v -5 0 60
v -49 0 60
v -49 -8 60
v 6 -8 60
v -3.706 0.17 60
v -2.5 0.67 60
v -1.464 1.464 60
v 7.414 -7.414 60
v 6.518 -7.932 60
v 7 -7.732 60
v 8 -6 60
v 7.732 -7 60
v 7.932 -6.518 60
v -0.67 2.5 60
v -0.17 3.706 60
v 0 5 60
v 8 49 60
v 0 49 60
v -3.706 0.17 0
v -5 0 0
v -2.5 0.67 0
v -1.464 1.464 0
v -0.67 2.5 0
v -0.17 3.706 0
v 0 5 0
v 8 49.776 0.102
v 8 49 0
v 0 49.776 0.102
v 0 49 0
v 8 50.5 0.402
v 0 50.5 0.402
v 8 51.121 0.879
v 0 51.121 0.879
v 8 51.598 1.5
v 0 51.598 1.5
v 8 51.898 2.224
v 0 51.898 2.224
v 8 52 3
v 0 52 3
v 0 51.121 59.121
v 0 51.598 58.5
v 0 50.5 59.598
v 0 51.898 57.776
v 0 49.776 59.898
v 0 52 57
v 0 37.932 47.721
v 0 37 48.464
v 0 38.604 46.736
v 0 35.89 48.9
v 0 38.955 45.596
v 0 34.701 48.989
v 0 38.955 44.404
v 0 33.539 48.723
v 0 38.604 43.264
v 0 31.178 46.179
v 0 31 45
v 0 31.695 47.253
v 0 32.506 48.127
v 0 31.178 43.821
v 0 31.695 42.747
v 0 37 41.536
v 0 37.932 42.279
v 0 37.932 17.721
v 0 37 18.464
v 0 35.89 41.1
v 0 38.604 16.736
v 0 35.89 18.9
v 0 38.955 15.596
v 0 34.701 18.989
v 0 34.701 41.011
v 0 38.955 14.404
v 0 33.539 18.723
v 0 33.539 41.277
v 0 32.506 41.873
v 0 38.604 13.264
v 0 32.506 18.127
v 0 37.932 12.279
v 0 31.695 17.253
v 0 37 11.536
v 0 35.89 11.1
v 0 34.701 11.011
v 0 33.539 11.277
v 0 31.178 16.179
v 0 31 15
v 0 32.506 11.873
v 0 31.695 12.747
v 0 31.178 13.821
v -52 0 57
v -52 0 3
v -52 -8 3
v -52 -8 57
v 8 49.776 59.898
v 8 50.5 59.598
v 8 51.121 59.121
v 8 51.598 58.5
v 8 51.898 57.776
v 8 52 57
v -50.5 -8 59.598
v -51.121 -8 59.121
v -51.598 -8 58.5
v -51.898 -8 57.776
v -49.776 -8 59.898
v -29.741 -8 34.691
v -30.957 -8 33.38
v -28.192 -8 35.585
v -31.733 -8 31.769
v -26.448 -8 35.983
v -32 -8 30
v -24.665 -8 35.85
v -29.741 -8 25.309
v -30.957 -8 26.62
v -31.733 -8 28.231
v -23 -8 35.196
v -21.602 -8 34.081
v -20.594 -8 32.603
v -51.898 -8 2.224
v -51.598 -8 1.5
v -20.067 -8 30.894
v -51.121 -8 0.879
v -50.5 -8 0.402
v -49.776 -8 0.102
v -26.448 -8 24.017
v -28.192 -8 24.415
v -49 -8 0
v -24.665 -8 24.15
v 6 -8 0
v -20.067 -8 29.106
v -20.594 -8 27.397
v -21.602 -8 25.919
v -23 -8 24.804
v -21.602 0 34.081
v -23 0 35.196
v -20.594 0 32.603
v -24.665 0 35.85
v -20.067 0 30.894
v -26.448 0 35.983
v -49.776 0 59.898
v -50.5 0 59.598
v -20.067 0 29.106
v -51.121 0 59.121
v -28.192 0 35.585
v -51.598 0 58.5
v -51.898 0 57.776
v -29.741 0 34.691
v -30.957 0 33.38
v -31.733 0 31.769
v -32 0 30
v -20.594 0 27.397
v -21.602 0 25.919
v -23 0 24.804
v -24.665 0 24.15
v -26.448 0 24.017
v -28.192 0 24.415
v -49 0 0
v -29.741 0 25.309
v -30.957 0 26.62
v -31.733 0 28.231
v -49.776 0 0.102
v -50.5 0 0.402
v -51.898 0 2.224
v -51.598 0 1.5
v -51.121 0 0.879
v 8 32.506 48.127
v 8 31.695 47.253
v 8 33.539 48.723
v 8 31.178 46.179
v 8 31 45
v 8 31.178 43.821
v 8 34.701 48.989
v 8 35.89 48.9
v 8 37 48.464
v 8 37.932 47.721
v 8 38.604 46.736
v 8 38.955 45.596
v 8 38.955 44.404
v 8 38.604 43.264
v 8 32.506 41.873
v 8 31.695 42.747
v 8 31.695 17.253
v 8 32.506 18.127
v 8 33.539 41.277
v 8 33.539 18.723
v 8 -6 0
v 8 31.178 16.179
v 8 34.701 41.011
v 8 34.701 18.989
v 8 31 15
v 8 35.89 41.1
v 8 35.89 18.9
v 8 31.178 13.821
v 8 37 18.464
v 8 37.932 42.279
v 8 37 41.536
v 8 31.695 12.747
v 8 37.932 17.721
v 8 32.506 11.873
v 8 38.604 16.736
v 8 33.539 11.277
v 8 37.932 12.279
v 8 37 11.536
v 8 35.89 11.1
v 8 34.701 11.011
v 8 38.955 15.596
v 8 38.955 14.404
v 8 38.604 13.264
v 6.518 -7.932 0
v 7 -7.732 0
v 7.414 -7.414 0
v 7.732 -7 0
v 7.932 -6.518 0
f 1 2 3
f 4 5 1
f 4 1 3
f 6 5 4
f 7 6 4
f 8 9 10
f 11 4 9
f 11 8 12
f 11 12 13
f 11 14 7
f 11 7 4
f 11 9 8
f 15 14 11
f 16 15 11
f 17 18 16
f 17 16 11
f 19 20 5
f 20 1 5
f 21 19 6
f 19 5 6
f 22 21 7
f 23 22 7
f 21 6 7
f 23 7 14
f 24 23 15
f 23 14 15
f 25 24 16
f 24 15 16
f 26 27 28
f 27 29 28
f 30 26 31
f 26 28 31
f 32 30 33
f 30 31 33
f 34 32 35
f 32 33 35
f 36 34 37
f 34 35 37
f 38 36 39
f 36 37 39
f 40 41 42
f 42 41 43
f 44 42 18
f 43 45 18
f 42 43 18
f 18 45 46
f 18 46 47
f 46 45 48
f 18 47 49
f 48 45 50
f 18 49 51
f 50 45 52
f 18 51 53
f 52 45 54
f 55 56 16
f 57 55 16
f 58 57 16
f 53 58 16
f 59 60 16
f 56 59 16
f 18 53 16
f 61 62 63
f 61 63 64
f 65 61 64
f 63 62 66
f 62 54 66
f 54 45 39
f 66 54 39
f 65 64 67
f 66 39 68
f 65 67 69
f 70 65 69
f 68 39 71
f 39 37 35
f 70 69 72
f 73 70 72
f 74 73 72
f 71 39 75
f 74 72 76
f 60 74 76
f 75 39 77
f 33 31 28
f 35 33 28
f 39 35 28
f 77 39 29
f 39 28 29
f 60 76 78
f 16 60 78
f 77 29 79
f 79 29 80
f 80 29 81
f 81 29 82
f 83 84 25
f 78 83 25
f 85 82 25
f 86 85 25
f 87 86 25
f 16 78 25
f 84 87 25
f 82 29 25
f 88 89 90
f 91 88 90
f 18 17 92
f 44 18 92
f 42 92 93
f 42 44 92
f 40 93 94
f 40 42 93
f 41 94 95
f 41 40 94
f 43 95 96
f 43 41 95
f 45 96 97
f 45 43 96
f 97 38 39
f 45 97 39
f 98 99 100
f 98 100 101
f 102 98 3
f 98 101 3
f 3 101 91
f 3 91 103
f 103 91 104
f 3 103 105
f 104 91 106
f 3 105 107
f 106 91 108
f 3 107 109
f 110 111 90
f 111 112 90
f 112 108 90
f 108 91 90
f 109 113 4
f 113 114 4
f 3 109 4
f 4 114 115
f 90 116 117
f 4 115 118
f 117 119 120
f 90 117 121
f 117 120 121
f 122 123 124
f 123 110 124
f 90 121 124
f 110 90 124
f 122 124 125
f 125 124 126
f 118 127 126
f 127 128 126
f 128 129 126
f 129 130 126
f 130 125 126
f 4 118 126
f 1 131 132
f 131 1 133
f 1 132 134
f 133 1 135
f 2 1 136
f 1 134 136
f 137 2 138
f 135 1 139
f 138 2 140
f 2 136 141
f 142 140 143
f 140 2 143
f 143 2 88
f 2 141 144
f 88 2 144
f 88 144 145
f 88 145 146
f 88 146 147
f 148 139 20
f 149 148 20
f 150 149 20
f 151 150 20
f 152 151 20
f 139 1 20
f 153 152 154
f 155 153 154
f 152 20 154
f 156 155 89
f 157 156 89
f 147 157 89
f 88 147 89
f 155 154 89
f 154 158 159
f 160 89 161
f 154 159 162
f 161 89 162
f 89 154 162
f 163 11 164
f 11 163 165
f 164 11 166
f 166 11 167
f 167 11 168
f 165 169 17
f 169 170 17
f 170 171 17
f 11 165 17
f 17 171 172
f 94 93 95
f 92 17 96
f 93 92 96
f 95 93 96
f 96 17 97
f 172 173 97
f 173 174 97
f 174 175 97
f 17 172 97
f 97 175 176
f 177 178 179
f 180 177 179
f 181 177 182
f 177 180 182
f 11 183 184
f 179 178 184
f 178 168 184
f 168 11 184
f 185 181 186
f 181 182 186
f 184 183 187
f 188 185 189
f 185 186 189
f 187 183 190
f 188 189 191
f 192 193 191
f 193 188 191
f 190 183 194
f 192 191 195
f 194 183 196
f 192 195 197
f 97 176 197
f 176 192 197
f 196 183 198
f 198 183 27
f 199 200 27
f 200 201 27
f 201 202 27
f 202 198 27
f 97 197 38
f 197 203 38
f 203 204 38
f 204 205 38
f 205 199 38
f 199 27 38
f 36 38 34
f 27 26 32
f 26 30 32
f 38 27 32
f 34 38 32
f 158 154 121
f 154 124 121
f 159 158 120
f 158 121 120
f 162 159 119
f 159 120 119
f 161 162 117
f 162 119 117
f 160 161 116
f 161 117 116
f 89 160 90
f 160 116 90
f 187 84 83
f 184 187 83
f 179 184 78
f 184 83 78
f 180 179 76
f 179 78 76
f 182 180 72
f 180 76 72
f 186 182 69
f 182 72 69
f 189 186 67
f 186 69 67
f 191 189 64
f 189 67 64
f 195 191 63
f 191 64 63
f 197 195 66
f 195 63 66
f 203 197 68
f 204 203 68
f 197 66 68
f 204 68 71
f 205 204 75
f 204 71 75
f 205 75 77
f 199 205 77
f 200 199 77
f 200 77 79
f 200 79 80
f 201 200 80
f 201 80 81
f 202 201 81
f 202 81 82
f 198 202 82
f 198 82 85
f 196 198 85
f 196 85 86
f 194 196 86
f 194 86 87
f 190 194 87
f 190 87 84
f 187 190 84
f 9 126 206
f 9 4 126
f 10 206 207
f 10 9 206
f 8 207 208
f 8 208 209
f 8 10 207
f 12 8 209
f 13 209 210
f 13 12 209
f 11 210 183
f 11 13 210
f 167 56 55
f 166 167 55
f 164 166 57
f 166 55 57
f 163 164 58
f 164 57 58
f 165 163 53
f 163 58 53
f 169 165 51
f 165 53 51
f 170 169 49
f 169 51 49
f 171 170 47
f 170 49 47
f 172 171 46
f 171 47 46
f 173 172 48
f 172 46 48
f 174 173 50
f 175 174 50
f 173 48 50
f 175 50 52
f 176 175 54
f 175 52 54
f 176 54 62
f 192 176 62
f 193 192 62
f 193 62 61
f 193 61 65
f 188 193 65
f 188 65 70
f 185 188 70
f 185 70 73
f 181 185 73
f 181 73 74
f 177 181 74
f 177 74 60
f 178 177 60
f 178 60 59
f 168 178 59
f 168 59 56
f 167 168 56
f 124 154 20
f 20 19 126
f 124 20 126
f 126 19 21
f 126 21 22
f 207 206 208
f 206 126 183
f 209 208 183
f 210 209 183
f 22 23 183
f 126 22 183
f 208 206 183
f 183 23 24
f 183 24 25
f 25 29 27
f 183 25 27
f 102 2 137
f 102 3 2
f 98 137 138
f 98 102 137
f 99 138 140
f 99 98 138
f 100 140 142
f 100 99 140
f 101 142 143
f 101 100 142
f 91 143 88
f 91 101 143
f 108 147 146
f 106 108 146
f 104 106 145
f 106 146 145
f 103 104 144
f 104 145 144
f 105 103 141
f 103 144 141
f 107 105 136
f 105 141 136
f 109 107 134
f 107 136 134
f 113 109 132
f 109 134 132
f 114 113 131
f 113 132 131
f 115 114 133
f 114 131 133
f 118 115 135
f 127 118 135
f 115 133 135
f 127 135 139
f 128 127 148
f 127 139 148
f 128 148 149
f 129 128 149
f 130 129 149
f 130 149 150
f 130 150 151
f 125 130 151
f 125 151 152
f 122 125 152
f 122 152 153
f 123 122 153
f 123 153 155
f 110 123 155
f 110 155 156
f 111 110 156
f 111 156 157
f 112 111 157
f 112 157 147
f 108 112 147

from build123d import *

# Parameters (mm, degrees)
BOSS_EXTRUDE2_DEPTH = 60
SKETCH3_R           = 4
CUT_EXTRUDE1_DEPTH  = 60
SKETCH4_R           = 6
CUT_EXTRUDE2_DEPTH  = 60
FILLET1_R           = 3
FILLET2_R           = 5
FILLET3_R           = 2


with BuildPart() as part:
    # Sketch1 → Boss-Extrude2 (new body)
    with BuildSketch(Plane.XY):
        Polygon((0, 0), (-52, 0), (-52, -8), (8, -8), (8, 52), (0, 52), align=None)
    extrude(amount=BOSS_EXTRUDE2_DEPTH)

    # Sketch3 → Cut-Extrude1 (cut)
    with BuildSketch(Plane.ZY):
        with Locations(Location((15, 35, 0), (0, 0, 270))):
            Circle(SKETCH3_R)
        with Locations(Location((45, 35, 0), (0, 0, 270))):
            Circle(SKETCH3_R)
    extrude(amount=-CUT_EXTRUDE1_DEPTH, mode=Mode.SUBTRACT)

    # Sketch4 → Cut-Extrude2 (cut)
    with BuildSketch(Plane(origin=(0, 0, 0), x_dir=(1, 0, 0), z_dir=(0, 1, 0))):
        with Locations(Location((-26, -30, 0), (0, 0, 180))):
            Circle(SKETCH4_R)
    extrude(amount=-CUT_EXTRUDE2_DEPTH, mode=Mode.SUBTRACT)

    # Fillet1
    fillet1_edges = [part.edges().sort_by_distance(p)[0] for p in [
        (-52, -4, 60),
        (4, 52, 60),
        (4, 52, 0),
        (-52, -4, 0),
    ]]
    fillet(fillet1_edges, radius=FILLET1_R)

    # Fillet2
    fillet2_edges = [part.edges().sort_by_distance(p)[0] for p in [
        (0, 0, 30),
    ]]
    fillet(fillet2_edges, radius=FILLET2_R)

    # Fillet3
    fillet3_edges = [part.edges().sort_by_distance(p)[0] for p in [
        (8, -8, 30),
    ]]
    fillet(fillet3_edges, radius=FILLET3_R)


solid = part.part
